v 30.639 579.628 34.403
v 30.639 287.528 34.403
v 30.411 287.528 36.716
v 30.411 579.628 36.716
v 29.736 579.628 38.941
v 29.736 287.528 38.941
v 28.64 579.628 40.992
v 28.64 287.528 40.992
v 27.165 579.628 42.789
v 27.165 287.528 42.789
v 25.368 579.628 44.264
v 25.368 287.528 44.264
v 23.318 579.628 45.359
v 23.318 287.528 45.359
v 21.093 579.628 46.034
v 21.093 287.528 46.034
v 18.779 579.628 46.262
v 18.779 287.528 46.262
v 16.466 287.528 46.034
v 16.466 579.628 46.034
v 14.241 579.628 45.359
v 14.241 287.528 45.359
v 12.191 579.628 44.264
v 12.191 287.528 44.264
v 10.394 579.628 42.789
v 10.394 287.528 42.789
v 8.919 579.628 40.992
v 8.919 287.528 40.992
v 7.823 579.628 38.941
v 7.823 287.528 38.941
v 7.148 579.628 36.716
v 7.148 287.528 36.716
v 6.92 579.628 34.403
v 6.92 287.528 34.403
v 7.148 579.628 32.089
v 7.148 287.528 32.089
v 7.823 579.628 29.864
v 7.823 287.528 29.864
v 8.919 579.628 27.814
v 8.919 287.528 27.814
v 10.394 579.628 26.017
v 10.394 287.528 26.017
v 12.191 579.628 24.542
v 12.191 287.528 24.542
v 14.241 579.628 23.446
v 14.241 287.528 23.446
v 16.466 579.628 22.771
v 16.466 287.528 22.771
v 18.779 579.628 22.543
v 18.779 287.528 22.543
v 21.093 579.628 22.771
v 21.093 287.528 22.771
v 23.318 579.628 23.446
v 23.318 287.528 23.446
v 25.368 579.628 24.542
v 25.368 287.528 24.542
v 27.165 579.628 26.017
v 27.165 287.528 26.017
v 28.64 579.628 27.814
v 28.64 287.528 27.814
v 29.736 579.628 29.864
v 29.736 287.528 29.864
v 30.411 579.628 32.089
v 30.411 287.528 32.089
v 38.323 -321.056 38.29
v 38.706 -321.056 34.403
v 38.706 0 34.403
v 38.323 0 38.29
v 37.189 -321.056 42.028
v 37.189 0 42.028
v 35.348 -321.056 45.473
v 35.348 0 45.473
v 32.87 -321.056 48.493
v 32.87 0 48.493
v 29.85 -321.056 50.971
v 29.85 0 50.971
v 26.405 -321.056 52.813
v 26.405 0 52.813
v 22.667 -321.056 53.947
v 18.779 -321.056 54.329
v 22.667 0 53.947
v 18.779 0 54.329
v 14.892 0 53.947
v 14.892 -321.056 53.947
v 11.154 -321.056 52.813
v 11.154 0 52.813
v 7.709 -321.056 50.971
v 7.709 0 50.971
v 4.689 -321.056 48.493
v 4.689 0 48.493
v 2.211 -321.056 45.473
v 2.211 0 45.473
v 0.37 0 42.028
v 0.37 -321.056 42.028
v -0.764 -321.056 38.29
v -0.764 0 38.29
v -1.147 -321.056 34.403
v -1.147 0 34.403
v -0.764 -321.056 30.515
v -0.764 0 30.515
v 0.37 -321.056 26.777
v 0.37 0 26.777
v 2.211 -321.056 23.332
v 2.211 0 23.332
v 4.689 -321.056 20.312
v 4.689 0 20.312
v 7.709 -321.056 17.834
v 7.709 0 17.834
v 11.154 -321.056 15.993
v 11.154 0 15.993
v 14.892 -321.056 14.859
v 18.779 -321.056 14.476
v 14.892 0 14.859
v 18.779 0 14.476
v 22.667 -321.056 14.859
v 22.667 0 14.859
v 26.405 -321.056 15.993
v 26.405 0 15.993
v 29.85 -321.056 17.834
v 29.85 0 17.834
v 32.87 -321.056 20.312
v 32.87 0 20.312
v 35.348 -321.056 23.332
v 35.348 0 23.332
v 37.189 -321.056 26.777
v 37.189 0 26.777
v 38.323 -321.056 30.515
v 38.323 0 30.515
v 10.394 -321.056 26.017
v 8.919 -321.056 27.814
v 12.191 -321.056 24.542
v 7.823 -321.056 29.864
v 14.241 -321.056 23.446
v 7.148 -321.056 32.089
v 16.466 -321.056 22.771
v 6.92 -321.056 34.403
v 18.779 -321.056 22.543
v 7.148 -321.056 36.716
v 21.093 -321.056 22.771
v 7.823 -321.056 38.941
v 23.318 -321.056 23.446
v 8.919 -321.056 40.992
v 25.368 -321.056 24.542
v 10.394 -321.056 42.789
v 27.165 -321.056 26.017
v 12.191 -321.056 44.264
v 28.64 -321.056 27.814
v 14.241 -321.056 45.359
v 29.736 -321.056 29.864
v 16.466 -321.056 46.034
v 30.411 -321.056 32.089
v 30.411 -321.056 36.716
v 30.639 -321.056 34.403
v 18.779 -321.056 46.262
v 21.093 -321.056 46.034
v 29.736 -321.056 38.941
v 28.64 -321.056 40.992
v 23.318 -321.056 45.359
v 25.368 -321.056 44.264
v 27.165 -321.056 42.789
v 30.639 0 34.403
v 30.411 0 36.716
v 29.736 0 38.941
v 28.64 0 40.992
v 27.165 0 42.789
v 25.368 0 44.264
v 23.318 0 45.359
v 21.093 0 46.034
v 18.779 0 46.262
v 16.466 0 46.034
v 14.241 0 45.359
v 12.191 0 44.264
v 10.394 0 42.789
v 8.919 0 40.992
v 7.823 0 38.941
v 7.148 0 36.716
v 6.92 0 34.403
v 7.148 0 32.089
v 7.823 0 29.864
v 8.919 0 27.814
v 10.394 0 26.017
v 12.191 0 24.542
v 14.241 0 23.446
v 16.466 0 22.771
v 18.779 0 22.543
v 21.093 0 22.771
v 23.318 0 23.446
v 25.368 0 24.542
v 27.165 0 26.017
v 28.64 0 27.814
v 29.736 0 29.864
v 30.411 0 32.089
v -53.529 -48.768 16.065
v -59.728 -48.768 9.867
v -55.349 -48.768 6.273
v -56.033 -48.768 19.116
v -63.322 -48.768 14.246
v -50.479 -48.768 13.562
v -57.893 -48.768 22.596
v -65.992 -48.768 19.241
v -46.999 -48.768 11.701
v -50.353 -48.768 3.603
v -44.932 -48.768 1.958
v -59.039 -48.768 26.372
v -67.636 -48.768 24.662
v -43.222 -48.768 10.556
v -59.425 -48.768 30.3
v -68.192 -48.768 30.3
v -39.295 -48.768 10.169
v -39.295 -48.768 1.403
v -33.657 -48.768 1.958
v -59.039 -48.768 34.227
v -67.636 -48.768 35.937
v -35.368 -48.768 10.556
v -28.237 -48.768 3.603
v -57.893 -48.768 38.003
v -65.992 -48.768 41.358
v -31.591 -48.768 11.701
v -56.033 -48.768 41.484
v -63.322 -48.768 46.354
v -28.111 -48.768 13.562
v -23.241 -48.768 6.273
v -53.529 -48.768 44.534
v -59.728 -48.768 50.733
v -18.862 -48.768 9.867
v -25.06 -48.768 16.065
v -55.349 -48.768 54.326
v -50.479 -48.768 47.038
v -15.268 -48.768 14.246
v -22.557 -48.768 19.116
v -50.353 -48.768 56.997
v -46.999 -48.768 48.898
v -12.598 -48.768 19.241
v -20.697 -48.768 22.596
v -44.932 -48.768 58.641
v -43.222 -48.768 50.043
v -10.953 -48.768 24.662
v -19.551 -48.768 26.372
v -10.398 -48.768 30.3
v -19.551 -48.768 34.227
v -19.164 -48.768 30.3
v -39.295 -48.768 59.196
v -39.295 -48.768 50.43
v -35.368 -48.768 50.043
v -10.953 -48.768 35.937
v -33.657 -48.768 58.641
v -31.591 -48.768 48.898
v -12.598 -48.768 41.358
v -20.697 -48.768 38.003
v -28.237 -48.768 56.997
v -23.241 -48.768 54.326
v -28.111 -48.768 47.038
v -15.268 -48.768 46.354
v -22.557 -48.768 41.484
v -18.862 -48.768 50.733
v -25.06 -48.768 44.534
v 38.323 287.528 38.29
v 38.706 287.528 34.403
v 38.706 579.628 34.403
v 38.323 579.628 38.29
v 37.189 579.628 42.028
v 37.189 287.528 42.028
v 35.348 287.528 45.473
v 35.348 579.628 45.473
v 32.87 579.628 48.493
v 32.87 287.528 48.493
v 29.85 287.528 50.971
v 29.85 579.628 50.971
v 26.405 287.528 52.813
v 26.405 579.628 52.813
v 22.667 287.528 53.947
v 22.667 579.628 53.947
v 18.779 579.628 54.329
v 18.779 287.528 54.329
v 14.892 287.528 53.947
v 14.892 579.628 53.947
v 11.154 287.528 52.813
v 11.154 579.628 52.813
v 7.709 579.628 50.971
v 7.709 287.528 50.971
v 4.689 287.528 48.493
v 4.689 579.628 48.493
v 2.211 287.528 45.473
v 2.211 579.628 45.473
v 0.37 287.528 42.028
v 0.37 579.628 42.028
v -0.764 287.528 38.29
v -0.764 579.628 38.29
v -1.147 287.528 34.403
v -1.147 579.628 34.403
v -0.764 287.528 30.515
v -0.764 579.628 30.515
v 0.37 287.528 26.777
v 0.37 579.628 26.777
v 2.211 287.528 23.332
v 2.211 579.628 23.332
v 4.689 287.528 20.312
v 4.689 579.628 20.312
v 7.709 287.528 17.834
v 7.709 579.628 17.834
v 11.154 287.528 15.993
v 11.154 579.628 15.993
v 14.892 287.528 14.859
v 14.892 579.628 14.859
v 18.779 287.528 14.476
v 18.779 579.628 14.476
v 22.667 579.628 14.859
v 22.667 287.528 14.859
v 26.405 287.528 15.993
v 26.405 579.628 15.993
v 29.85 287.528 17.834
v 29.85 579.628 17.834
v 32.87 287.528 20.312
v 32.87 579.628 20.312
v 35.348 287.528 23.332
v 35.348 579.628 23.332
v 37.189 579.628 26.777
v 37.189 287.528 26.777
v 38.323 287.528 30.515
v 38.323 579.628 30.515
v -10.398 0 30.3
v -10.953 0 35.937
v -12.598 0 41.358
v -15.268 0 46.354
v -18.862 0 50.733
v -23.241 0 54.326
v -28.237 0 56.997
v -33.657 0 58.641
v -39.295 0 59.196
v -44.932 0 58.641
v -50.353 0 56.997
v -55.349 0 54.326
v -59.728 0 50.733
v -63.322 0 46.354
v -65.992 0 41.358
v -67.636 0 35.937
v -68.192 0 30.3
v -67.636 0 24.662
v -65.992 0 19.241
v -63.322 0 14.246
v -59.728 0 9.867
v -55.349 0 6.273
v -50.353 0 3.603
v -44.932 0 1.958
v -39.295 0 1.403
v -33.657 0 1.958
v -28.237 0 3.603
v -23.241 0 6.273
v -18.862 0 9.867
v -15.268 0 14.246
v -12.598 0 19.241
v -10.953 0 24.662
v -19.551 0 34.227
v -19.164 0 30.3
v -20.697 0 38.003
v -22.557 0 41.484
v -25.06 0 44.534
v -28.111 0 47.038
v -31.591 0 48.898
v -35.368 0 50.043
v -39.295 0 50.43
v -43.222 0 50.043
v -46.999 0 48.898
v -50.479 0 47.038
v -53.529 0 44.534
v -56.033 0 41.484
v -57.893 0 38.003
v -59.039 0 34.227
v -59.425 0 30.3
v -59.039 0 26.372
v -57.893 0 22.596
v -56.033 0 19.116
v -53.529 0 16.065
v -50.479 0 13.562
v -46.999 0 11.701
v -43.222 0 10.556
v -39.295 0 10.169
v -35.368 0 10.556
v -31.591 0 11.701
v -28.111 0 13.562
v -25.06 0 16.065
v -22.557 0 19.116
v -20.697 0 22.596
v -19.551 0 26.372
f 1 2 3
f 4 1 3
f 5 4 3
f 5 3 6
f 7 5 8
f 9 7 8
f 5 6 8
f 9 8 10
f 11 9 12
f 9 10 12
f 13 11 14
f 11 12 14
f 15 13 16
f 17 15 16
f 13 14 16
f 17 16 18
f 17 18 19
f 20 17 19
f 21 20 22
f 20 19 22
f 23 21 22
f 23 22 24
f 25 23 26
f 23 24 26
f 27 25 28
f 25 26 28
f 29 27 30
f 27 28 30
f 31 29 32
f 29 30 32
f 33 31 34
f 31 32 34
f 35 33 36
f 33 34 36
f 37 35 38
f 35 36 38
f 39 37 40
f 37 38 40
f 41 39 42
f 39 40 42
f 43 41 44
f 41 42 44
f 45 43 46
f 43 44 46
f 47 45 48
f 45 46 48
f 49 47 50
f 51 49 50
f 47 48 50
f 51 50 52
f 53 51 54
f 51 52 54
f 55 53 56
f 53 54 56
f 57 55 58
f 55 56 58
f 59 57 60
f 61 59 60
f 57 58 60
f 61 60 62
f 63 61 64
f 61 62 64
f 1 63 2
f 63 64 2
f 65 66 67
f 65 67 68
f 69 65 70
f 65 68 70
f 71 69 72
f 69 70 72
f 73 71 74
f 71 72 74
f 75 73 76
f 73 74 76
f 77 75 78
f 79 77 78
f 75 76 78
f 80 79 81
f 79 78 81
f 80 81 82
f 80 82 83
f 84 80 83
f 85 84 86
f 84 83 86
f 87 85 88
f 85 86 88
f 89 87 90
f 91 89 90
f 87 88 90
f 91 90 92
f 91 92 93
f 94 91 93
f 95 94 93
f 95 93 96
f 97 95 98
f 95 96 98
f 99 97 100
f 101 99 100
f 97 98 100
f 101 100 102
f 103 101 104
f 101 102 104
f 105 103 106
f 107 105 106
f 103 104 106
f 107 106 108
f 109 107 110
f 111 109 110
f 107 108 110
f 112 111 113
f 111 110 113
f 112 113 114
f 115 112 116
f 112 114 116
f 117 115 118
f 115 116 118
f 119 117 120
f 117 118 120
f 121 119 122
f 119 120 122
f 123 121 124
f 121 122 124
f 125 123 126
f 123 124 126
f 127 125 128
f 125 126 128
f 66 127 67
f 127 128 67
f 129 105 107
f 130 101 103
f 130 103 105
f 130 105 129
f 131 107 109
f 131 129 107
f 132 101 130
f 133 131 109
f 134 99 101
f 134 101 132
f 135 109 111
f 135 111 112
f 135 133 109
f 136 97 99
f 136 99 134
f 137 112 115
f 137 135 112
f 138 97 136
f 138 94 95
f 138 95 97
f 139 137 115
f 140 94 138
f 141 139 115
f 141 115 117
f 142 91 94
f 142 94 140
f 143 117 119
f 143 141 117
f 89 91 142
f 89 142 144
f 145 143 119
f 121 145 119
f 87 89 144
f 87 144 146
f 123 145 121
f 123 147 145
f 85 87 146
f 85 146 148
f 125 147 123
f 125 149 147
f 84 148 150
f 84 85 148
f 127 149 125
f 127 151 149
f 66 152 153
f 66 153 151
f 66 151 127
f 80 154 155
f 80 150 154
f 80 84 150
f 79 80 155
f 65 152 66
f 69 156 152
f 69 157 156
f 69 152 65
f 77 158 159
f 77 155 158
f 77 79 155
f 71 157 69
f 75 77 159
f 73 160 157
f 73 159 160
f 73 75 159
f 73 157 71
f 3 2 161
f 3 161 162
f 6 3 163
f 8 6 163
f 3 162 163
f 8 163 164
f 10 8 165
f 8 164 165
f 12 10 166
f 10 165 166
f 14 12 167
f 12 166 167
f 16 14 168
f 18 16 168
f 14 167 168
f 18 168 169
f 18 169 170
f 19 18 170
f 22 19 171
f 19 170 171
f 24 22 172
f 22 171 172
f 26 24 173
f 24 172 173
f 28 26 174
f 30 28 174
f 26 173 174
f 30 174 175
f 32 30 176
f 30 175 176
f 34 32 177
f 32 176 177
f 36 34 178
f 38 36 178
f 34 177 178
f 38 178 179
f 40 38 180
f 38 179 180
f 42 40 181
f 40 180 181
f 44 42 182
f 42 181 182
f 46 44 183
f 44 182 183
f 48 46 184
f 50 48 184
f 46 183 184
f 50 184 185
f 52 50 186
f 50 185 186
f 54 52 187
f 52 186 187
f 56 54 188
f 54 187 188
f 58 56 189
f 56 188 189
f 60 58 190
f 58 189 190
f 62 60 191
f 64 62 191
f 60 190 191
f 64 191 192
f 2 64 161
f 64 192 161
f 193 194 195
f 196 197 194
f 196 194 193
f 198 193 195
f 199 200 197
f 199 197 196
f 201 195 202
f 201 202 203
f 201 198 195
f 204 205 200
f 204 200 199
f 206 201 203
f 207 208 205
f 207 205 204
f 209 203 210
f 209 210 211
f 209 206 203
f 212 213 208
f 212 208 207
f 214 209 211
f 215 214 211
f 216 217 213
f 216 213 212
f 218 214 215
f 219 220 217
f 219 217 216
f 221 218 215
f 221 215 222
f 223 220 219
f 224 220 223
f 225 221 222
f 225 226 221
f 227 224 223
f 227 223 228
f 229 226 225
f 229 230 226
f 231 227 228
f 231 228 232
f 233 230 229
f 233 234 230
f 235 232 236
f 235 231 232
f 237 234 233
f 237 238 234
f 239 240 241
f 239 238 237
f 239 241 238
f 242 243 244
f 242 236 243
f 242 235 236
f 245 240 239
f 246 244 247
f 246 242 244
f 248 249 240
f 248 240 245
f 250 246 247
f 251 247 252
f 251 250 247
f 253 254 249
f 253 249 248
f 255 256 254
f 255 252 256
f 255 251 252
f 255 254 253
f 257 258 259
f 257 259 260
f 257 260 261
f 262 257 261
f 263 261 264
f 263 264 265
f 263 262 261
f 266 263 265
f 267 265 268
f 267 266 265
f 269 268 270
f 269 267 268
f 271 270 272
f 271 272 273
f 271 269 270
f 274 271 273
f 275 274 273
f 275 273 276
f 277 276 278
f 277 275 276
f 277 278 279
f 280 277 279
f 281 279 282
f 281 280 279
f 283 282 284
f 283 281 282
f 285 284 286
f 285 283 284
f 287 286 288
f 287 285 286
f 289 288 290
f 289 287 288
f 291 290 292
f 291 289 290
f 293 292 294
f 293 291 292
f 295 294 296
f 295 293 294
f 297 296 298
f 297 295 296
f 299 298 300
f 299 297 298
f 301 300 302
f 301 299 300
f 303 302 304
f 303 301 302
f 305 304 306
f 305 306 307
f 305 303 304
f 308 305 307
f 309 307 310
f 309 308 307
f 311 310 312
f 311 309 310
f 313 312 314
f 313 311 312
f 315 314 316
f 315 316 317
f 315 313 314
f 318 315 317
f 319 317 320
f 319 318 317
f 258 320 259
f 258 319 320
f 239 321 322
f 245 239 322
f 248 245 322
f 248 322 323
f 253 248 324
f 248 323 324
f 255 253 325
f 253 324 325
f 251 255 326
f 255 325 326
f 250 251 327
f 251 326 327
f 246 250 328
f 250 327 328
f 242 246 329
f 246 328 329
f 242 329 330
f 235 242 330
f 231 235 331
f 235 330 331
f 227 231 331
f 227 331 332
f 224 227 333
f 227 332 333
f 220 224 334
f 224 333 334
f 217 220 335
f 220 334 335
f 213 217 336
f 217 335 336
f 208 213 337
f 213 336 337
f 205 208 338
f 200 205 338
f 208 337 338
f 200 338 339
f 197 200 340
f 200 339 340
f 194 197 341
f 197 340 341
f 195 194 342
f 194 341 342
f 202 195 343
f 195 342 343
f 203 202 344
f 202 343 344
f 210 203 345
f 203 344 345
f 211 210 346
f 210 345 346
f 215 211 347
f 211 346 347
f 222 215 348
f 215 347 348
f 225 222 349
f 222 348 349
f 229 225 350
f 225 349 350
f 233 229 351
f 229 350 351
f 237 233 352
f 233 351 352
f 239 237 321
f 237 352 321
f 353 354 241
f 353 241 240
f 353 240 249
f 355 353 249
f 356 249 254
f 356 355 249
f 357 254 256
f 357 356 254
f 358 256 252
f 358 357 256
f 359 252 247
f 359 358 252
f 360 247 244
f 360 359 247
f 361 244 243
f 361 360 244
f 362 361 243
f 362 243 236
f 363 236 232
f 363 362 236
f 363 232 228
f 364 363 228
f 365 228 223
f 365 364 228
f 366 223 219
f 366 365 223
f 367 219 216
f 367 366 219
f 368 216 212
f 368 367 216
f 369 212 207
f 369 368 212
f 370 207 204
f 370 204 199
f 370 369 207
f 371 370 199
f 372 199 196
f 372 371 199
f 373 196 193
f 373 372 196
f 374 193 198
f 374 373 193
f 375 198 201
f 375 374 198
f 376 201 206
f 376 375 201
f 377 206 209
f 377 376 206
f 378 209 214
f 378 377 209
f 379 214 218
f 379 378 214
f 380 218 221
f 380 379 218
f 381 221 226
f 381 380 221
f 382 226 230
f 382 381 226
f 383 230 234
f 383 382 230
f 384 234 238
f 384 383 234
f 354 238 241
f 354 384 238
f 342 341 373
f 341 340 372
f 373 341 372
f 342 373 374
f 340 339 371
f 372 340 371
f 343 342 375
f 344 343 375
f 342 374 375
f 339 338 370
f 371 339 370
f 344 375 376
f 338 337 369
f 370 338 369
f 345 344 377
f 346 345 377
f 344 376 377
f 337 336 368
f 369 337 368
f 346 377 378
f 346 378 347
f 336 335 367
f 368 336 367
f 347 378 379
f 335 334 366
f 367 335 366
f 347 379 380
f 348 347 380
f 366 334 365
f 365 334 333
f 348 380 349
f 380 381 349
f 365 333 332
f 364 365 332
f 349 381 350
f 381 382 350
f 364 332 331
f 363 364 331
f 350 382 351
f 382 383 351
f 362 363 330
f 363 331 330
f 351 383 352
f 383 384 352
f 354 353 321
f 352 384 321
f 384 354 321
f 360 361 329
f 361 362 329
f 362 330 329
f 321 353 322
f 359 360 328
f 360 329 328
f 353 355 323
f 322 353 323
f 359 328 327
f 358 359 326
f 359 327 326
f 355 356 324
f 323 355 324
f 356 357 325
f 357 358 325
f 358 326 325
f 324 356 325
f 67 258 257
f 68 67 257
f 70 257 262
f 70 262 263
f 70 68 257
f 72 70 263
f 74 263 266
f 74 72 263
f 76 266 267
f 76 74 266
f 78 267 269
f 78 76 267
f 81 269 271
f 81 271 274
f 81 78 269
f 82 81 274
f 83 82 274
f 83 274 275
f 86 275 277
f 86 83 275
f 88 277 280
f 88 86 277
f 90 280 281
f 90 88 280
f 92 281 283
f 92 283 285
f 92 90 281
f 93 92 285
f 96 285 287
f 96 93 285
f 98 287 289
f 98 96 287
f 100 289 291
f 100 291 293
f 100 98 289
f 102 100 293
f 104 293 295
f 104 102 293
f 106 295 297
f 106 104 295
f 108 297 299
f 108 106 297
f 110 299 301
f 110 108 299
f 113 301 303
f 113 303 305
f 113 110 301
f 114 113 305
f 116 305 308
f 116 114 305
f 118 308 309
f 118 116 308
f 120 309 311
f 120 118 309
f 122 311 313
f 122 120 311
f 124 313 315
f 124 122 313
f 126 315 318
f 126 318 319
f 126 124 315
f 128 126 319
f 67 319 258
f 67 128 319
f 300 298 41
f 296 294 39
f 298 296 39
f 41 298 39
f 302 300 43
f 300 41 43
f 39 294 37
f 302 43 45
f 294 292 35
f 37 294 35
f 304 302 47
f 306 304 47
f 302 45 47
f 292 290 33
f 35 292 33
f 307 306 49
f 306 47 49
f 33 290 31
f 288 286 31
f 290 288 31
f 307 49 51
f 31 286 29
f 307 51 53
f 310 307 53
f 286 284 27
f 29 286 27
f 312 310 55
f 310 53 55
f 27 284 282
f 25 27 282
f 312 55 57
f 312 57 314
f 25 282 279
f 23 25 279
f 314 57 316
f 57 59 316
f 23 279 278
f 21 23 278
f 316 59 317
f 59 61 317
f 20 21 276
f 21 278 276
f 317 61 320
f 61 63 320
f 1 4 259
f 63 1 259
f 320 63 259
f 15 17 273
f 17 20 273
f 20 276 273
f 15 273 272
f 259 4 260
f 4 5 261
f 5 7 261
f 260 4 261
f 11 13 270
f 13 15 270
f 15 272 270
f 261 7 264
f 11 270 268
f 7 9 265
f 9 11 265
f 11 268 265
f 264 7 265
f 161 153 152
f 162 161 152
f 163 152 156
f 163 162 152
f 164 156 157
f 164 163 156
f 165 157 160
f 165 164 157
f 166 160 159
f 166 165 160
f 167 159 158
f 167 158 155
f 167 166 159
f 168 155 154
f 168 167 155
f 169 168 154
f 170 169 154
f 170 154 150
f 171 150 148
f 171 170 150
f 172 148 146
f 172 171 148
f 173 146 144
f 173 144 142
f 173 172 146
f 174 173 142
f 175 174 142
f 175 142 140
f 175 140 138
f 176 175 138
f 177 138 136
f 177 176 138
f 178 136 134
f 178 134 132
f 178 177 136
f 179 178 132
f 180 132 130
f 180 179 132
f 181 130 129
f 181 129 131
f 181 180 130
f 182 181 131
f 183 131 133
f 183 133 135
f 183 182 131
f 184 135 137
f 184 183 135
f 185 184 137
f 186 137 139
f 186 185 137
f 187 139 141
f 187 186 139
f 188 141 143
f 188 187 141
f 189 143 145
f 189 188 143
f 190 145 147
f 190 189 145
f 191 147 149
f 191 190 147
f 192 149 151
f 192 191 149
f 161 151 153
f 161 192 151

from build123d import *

# Parameters (mm, degrees)
F0_R     = 28.8966469819
F0_R_2   = 20.1306031815
F1_DEPTH = 48.768
F2_R     = 19.9266814882
F2_R_2   = 11.8595015416
F3_DEPTH = 155.194
F4_DEPTH = 165.862
F5_DEPTH = 287.528
F6_DEPTH = 292.1


with BuildPart() as f1:
    # F0 (on Front) → F1 (new body)
    with BuildSketch(Plane.XZ):
        with Locations((-39.2948538065, 30.2996449172)):
            Circle(F0_R)
        with Locations((-39.2948538065, 30.2996449172)):
            Circle(F0_R_2, mode=Mode.SUBTRACT)
    extrude(amount=F1_DEPTH)


with BuildPart() as f3:
    # F2 (on Front) → F3 (new body)
    with BuildSketch(Plane.XZ):
        with Locations((18.7794677913, 34.4027206302)):
            Circle(F2_R)
        with Locations((18.7794677913, 34.4027206302)):
            Circle(F2_R_2, mode=Mode.SUBTRACT)
    extrude(amount=F3_DEPTH)

    # F4 (add): a face of the model
    f4_faces = [f3.faces().sort_by_distance(p)[0] for p in [
        (-0.5836020326, -155.194, 34.4027206302),
    ]]
    extrude(f4_faces, amount=F4_DEPTH)

    # F5 (add): a face of the model
    f5_faces = [f3.faces().sort_by_distance(p)[0] for p in [
        (-0.5836020326, 0, 34.4027206302),
    ]]
    extrude(f5_faces, amount=F5_DEPTH)

    # F6 (add): a face of the model
    f6_faces = [f3.faces().sort_by_distance(p)[0] for p in [
        (-0.5836020326, 287.528, 34.4027206302),
    ]]
    extrude(f6_faces, amount=F6_DEPTH)


solid = Compound([f1.part, f3.part])
